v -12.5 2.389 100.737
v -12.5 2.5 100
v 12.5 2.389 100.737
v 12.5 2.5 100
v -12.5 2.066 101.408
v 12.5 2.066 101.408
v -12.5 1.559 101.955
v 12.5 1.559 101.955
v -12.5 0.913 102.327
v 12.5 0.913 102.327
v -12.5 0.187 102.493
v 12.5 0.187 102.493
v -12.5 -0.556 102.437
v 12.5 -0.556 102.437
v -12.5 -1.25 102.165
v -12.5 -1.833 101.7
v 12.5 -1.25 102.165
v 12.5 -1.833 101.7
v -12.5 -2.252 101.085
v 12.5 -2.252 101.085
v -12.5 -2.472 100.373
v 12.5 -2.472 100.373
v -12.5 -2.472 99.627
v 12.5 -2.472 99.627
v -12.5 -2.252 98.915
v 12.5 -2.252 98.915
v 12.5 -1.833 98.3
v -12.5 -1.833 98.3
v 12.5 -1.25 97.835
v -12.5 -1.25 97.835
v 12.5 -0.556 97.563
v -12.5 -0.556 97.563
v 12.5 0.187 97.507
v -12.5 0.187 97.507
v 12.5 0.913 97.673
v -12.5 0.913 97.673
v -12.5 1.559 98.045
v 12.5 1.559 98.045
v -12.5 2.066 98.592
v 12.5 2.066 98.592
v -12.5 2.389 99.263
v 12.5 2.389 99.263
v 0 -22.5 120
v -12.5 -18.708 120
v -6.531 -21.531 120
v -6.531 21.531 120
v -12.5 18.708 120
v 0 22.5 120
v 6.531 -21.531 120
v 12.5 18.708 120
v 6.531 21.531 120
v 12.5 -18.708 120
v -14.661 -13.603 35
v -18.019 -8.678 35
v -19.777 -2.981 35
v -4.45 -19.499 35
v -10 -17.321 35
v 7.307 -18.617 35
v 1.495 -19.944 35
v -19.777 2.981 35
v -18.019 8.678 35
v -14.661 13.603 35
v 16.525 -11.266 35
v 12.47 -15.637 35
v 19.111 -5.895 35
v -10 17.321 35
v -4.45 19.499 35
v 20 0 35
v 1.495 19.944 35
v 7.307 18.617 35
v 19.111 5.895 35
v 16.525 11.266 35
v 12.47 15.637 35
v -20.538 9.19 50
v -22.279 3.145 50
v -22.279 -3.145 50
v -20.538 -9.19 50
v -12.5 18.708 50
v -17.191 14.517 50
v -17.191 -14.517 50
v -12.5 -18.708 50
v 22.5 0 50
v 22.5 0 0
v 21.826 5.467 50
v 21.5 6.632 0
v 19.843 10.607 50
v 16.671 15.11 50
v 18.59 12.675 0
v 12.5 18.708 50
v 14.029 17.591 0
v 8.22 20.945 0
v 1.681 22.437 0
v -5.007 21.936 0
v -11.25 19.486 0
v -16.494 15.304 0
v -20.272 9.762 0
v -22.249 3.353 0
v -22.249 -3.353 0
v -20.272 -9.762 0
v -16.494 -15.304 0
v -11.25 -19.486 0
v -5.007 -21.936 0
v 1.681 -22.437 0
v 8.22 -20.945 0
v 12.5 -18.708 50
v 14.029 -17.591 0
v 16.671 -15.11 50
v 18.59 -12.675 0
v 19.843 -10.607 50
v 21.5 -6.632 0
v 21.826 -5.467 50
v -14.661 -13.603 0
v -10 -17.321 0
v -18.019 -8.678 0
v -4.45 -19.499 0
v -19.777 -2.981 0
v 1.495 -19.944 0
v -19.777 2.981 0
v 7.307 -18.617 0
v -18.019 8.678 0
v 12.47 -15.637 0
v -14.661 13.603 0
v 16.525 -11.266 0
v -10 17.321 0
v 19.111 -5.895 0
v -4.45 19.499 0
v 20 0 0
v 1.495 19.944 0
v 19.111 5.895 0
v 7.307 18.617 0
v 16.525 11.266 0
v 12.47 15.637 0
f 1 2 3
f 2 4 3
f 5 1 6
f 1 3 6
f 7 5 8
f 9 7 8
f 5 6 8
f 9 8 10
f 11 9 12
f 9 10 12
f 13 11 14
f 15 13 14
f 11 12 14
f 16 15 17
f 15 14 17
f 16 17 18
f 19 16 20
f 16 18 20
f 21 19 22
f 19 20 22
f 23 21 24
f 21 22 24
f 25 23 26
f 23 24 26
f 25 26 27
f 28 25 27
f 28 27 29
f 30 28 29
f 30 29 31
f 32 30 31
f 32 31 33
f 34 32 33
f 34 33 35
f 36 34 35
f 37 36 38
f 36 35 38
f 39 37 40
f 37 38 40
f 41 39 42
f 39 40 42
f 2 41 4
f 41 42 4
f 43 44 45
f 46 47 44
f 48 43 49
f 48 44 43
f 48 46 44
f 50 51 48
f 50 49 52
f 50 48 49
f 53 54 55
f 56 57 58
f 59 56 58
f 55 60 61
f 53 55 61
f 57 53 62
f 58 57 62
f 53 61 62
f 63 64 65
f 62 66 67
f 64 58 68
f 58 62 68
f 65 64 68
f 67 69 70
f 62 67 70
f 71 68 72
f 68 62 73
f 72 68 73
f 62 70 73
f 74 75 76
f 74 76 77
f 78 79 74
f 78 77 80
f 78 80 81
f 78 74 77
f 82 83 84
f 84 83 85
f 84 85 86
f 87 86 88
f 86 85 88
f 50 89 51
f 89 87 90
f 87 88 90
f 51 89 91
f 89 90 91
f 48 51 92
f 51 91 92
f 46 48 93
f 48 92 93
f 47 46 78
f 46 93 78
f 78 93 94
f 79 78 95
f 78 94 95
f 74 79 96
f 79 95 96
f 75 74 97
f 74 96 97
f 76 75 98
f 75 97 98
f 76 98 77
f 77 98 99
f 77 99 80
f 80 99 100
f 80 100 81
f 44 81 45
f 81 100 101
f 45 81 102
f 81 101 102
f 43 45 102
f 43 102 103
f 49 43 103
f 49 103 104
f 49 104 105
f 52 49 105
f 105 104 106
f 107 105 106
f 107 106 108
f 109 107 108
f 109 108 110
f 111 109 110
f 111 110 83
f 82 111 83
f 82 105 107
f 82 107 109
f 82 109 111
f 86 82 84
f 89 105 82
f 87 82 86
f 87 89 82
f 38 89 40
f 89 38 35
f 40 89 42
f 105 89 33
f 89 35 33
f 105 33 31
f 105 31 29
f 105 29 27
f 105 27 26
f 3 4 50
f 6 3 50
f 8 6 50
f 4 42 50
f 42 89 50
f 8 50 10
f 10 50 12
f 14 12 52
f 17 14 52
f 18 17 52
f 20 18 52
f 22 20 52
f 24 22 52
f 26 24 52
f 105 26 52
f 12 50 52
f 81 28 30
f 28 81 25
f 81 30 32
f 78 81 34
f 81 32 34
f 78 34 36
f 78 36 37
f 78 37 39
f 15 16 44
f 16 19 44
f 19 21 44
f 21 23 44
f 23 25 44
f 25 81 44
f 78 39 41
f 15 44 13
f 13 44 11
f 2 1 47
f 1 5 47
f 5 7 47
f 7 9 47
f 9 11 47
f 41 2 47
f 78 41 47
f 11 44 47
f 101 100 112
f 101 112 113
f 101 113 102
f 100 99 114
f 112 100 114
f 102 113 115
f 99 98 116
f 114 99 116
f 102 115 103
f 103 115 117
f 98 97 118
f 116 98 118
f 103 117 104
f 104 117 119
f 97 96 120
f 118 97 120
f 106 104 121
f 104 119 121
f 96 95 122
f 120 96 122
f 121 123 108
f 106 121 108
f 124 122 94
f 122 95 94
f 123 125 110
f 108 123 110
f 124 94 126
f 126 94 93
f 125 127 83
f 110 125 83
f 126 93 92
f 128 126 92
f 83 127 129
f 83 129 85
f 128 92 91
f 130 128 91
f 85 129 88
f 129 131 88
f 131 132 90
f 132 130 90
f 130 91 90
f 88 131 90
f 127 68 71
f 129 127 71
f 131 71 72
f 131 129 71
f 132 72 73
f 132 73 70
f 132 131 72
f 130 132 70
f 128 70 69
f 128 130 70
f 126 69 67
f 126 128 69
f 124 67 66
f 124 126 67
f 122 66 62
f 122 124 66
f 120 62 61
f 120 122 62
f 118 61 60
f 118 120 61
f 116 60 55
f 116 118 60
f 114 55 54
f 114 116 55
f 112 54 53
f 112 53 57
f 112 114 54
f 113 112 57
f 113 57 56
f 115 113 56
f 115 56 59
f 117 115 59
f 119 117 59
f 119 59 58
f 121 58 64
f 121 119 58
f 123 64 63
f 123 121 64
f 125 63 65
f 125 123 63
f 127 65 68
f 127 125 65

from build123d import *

# Parameters (mm, degrees)
F0_R     = 22.5
F1_DEPTH = 120
F3_DEPTH = 70
F4_R     = 20
F5_DEPTH = 35
F6_R     = 2.5
F7_DEPTH = 50


with BuildPart() as f1:
    # F0 (on Top) → F1 (new body)
    with BuildSketch(Plane.XY):
        Circle(F0_R)
    extrude(amount=F1_DEPTH)

    # F2 (on face) → F3 (cut)
    with BuildSketch(Plane.XY.offset(120)):
        with BuildLine():
            ThreePointArc((22.5, 0), (19.843135, 10.606602), (12.5, 18.708287))
            Line((12.5, 18.708287), (12.5, -18.708287))
            ThreePointArc((12.5, -18.708287), (19.843135, -10.606602), (22.5, 0))
        make_face()
        with BuildLine():
            Line((-12.5, -18.708287), (-12.5, 18.708287))
            ThreePointArc((-12.5, 18.708287), (-22.5, 0), (-12.5, -18.708287))
        make_face()
    extrude(amount=-F3_DEPTH, mode=Mode.SUBTRACT)

    # F4 (on Top) → F5 (cut)
    with BuildSketch(Plane.XY):
        Circle(F4_R)
    extrude(amount=F5_DEPTH, mode=Mode.SUBTRACT)

    # F6 (on Right) → F7 (cut, symmetric)
    with BuildSketch(Plane.YZ):
        with Locations((0, 100)):
            Circle(F6_R)
    extrude(amount=F7_DEPTH, both=True, mode=Mode.SUBTRACT)


solid = f1.part
